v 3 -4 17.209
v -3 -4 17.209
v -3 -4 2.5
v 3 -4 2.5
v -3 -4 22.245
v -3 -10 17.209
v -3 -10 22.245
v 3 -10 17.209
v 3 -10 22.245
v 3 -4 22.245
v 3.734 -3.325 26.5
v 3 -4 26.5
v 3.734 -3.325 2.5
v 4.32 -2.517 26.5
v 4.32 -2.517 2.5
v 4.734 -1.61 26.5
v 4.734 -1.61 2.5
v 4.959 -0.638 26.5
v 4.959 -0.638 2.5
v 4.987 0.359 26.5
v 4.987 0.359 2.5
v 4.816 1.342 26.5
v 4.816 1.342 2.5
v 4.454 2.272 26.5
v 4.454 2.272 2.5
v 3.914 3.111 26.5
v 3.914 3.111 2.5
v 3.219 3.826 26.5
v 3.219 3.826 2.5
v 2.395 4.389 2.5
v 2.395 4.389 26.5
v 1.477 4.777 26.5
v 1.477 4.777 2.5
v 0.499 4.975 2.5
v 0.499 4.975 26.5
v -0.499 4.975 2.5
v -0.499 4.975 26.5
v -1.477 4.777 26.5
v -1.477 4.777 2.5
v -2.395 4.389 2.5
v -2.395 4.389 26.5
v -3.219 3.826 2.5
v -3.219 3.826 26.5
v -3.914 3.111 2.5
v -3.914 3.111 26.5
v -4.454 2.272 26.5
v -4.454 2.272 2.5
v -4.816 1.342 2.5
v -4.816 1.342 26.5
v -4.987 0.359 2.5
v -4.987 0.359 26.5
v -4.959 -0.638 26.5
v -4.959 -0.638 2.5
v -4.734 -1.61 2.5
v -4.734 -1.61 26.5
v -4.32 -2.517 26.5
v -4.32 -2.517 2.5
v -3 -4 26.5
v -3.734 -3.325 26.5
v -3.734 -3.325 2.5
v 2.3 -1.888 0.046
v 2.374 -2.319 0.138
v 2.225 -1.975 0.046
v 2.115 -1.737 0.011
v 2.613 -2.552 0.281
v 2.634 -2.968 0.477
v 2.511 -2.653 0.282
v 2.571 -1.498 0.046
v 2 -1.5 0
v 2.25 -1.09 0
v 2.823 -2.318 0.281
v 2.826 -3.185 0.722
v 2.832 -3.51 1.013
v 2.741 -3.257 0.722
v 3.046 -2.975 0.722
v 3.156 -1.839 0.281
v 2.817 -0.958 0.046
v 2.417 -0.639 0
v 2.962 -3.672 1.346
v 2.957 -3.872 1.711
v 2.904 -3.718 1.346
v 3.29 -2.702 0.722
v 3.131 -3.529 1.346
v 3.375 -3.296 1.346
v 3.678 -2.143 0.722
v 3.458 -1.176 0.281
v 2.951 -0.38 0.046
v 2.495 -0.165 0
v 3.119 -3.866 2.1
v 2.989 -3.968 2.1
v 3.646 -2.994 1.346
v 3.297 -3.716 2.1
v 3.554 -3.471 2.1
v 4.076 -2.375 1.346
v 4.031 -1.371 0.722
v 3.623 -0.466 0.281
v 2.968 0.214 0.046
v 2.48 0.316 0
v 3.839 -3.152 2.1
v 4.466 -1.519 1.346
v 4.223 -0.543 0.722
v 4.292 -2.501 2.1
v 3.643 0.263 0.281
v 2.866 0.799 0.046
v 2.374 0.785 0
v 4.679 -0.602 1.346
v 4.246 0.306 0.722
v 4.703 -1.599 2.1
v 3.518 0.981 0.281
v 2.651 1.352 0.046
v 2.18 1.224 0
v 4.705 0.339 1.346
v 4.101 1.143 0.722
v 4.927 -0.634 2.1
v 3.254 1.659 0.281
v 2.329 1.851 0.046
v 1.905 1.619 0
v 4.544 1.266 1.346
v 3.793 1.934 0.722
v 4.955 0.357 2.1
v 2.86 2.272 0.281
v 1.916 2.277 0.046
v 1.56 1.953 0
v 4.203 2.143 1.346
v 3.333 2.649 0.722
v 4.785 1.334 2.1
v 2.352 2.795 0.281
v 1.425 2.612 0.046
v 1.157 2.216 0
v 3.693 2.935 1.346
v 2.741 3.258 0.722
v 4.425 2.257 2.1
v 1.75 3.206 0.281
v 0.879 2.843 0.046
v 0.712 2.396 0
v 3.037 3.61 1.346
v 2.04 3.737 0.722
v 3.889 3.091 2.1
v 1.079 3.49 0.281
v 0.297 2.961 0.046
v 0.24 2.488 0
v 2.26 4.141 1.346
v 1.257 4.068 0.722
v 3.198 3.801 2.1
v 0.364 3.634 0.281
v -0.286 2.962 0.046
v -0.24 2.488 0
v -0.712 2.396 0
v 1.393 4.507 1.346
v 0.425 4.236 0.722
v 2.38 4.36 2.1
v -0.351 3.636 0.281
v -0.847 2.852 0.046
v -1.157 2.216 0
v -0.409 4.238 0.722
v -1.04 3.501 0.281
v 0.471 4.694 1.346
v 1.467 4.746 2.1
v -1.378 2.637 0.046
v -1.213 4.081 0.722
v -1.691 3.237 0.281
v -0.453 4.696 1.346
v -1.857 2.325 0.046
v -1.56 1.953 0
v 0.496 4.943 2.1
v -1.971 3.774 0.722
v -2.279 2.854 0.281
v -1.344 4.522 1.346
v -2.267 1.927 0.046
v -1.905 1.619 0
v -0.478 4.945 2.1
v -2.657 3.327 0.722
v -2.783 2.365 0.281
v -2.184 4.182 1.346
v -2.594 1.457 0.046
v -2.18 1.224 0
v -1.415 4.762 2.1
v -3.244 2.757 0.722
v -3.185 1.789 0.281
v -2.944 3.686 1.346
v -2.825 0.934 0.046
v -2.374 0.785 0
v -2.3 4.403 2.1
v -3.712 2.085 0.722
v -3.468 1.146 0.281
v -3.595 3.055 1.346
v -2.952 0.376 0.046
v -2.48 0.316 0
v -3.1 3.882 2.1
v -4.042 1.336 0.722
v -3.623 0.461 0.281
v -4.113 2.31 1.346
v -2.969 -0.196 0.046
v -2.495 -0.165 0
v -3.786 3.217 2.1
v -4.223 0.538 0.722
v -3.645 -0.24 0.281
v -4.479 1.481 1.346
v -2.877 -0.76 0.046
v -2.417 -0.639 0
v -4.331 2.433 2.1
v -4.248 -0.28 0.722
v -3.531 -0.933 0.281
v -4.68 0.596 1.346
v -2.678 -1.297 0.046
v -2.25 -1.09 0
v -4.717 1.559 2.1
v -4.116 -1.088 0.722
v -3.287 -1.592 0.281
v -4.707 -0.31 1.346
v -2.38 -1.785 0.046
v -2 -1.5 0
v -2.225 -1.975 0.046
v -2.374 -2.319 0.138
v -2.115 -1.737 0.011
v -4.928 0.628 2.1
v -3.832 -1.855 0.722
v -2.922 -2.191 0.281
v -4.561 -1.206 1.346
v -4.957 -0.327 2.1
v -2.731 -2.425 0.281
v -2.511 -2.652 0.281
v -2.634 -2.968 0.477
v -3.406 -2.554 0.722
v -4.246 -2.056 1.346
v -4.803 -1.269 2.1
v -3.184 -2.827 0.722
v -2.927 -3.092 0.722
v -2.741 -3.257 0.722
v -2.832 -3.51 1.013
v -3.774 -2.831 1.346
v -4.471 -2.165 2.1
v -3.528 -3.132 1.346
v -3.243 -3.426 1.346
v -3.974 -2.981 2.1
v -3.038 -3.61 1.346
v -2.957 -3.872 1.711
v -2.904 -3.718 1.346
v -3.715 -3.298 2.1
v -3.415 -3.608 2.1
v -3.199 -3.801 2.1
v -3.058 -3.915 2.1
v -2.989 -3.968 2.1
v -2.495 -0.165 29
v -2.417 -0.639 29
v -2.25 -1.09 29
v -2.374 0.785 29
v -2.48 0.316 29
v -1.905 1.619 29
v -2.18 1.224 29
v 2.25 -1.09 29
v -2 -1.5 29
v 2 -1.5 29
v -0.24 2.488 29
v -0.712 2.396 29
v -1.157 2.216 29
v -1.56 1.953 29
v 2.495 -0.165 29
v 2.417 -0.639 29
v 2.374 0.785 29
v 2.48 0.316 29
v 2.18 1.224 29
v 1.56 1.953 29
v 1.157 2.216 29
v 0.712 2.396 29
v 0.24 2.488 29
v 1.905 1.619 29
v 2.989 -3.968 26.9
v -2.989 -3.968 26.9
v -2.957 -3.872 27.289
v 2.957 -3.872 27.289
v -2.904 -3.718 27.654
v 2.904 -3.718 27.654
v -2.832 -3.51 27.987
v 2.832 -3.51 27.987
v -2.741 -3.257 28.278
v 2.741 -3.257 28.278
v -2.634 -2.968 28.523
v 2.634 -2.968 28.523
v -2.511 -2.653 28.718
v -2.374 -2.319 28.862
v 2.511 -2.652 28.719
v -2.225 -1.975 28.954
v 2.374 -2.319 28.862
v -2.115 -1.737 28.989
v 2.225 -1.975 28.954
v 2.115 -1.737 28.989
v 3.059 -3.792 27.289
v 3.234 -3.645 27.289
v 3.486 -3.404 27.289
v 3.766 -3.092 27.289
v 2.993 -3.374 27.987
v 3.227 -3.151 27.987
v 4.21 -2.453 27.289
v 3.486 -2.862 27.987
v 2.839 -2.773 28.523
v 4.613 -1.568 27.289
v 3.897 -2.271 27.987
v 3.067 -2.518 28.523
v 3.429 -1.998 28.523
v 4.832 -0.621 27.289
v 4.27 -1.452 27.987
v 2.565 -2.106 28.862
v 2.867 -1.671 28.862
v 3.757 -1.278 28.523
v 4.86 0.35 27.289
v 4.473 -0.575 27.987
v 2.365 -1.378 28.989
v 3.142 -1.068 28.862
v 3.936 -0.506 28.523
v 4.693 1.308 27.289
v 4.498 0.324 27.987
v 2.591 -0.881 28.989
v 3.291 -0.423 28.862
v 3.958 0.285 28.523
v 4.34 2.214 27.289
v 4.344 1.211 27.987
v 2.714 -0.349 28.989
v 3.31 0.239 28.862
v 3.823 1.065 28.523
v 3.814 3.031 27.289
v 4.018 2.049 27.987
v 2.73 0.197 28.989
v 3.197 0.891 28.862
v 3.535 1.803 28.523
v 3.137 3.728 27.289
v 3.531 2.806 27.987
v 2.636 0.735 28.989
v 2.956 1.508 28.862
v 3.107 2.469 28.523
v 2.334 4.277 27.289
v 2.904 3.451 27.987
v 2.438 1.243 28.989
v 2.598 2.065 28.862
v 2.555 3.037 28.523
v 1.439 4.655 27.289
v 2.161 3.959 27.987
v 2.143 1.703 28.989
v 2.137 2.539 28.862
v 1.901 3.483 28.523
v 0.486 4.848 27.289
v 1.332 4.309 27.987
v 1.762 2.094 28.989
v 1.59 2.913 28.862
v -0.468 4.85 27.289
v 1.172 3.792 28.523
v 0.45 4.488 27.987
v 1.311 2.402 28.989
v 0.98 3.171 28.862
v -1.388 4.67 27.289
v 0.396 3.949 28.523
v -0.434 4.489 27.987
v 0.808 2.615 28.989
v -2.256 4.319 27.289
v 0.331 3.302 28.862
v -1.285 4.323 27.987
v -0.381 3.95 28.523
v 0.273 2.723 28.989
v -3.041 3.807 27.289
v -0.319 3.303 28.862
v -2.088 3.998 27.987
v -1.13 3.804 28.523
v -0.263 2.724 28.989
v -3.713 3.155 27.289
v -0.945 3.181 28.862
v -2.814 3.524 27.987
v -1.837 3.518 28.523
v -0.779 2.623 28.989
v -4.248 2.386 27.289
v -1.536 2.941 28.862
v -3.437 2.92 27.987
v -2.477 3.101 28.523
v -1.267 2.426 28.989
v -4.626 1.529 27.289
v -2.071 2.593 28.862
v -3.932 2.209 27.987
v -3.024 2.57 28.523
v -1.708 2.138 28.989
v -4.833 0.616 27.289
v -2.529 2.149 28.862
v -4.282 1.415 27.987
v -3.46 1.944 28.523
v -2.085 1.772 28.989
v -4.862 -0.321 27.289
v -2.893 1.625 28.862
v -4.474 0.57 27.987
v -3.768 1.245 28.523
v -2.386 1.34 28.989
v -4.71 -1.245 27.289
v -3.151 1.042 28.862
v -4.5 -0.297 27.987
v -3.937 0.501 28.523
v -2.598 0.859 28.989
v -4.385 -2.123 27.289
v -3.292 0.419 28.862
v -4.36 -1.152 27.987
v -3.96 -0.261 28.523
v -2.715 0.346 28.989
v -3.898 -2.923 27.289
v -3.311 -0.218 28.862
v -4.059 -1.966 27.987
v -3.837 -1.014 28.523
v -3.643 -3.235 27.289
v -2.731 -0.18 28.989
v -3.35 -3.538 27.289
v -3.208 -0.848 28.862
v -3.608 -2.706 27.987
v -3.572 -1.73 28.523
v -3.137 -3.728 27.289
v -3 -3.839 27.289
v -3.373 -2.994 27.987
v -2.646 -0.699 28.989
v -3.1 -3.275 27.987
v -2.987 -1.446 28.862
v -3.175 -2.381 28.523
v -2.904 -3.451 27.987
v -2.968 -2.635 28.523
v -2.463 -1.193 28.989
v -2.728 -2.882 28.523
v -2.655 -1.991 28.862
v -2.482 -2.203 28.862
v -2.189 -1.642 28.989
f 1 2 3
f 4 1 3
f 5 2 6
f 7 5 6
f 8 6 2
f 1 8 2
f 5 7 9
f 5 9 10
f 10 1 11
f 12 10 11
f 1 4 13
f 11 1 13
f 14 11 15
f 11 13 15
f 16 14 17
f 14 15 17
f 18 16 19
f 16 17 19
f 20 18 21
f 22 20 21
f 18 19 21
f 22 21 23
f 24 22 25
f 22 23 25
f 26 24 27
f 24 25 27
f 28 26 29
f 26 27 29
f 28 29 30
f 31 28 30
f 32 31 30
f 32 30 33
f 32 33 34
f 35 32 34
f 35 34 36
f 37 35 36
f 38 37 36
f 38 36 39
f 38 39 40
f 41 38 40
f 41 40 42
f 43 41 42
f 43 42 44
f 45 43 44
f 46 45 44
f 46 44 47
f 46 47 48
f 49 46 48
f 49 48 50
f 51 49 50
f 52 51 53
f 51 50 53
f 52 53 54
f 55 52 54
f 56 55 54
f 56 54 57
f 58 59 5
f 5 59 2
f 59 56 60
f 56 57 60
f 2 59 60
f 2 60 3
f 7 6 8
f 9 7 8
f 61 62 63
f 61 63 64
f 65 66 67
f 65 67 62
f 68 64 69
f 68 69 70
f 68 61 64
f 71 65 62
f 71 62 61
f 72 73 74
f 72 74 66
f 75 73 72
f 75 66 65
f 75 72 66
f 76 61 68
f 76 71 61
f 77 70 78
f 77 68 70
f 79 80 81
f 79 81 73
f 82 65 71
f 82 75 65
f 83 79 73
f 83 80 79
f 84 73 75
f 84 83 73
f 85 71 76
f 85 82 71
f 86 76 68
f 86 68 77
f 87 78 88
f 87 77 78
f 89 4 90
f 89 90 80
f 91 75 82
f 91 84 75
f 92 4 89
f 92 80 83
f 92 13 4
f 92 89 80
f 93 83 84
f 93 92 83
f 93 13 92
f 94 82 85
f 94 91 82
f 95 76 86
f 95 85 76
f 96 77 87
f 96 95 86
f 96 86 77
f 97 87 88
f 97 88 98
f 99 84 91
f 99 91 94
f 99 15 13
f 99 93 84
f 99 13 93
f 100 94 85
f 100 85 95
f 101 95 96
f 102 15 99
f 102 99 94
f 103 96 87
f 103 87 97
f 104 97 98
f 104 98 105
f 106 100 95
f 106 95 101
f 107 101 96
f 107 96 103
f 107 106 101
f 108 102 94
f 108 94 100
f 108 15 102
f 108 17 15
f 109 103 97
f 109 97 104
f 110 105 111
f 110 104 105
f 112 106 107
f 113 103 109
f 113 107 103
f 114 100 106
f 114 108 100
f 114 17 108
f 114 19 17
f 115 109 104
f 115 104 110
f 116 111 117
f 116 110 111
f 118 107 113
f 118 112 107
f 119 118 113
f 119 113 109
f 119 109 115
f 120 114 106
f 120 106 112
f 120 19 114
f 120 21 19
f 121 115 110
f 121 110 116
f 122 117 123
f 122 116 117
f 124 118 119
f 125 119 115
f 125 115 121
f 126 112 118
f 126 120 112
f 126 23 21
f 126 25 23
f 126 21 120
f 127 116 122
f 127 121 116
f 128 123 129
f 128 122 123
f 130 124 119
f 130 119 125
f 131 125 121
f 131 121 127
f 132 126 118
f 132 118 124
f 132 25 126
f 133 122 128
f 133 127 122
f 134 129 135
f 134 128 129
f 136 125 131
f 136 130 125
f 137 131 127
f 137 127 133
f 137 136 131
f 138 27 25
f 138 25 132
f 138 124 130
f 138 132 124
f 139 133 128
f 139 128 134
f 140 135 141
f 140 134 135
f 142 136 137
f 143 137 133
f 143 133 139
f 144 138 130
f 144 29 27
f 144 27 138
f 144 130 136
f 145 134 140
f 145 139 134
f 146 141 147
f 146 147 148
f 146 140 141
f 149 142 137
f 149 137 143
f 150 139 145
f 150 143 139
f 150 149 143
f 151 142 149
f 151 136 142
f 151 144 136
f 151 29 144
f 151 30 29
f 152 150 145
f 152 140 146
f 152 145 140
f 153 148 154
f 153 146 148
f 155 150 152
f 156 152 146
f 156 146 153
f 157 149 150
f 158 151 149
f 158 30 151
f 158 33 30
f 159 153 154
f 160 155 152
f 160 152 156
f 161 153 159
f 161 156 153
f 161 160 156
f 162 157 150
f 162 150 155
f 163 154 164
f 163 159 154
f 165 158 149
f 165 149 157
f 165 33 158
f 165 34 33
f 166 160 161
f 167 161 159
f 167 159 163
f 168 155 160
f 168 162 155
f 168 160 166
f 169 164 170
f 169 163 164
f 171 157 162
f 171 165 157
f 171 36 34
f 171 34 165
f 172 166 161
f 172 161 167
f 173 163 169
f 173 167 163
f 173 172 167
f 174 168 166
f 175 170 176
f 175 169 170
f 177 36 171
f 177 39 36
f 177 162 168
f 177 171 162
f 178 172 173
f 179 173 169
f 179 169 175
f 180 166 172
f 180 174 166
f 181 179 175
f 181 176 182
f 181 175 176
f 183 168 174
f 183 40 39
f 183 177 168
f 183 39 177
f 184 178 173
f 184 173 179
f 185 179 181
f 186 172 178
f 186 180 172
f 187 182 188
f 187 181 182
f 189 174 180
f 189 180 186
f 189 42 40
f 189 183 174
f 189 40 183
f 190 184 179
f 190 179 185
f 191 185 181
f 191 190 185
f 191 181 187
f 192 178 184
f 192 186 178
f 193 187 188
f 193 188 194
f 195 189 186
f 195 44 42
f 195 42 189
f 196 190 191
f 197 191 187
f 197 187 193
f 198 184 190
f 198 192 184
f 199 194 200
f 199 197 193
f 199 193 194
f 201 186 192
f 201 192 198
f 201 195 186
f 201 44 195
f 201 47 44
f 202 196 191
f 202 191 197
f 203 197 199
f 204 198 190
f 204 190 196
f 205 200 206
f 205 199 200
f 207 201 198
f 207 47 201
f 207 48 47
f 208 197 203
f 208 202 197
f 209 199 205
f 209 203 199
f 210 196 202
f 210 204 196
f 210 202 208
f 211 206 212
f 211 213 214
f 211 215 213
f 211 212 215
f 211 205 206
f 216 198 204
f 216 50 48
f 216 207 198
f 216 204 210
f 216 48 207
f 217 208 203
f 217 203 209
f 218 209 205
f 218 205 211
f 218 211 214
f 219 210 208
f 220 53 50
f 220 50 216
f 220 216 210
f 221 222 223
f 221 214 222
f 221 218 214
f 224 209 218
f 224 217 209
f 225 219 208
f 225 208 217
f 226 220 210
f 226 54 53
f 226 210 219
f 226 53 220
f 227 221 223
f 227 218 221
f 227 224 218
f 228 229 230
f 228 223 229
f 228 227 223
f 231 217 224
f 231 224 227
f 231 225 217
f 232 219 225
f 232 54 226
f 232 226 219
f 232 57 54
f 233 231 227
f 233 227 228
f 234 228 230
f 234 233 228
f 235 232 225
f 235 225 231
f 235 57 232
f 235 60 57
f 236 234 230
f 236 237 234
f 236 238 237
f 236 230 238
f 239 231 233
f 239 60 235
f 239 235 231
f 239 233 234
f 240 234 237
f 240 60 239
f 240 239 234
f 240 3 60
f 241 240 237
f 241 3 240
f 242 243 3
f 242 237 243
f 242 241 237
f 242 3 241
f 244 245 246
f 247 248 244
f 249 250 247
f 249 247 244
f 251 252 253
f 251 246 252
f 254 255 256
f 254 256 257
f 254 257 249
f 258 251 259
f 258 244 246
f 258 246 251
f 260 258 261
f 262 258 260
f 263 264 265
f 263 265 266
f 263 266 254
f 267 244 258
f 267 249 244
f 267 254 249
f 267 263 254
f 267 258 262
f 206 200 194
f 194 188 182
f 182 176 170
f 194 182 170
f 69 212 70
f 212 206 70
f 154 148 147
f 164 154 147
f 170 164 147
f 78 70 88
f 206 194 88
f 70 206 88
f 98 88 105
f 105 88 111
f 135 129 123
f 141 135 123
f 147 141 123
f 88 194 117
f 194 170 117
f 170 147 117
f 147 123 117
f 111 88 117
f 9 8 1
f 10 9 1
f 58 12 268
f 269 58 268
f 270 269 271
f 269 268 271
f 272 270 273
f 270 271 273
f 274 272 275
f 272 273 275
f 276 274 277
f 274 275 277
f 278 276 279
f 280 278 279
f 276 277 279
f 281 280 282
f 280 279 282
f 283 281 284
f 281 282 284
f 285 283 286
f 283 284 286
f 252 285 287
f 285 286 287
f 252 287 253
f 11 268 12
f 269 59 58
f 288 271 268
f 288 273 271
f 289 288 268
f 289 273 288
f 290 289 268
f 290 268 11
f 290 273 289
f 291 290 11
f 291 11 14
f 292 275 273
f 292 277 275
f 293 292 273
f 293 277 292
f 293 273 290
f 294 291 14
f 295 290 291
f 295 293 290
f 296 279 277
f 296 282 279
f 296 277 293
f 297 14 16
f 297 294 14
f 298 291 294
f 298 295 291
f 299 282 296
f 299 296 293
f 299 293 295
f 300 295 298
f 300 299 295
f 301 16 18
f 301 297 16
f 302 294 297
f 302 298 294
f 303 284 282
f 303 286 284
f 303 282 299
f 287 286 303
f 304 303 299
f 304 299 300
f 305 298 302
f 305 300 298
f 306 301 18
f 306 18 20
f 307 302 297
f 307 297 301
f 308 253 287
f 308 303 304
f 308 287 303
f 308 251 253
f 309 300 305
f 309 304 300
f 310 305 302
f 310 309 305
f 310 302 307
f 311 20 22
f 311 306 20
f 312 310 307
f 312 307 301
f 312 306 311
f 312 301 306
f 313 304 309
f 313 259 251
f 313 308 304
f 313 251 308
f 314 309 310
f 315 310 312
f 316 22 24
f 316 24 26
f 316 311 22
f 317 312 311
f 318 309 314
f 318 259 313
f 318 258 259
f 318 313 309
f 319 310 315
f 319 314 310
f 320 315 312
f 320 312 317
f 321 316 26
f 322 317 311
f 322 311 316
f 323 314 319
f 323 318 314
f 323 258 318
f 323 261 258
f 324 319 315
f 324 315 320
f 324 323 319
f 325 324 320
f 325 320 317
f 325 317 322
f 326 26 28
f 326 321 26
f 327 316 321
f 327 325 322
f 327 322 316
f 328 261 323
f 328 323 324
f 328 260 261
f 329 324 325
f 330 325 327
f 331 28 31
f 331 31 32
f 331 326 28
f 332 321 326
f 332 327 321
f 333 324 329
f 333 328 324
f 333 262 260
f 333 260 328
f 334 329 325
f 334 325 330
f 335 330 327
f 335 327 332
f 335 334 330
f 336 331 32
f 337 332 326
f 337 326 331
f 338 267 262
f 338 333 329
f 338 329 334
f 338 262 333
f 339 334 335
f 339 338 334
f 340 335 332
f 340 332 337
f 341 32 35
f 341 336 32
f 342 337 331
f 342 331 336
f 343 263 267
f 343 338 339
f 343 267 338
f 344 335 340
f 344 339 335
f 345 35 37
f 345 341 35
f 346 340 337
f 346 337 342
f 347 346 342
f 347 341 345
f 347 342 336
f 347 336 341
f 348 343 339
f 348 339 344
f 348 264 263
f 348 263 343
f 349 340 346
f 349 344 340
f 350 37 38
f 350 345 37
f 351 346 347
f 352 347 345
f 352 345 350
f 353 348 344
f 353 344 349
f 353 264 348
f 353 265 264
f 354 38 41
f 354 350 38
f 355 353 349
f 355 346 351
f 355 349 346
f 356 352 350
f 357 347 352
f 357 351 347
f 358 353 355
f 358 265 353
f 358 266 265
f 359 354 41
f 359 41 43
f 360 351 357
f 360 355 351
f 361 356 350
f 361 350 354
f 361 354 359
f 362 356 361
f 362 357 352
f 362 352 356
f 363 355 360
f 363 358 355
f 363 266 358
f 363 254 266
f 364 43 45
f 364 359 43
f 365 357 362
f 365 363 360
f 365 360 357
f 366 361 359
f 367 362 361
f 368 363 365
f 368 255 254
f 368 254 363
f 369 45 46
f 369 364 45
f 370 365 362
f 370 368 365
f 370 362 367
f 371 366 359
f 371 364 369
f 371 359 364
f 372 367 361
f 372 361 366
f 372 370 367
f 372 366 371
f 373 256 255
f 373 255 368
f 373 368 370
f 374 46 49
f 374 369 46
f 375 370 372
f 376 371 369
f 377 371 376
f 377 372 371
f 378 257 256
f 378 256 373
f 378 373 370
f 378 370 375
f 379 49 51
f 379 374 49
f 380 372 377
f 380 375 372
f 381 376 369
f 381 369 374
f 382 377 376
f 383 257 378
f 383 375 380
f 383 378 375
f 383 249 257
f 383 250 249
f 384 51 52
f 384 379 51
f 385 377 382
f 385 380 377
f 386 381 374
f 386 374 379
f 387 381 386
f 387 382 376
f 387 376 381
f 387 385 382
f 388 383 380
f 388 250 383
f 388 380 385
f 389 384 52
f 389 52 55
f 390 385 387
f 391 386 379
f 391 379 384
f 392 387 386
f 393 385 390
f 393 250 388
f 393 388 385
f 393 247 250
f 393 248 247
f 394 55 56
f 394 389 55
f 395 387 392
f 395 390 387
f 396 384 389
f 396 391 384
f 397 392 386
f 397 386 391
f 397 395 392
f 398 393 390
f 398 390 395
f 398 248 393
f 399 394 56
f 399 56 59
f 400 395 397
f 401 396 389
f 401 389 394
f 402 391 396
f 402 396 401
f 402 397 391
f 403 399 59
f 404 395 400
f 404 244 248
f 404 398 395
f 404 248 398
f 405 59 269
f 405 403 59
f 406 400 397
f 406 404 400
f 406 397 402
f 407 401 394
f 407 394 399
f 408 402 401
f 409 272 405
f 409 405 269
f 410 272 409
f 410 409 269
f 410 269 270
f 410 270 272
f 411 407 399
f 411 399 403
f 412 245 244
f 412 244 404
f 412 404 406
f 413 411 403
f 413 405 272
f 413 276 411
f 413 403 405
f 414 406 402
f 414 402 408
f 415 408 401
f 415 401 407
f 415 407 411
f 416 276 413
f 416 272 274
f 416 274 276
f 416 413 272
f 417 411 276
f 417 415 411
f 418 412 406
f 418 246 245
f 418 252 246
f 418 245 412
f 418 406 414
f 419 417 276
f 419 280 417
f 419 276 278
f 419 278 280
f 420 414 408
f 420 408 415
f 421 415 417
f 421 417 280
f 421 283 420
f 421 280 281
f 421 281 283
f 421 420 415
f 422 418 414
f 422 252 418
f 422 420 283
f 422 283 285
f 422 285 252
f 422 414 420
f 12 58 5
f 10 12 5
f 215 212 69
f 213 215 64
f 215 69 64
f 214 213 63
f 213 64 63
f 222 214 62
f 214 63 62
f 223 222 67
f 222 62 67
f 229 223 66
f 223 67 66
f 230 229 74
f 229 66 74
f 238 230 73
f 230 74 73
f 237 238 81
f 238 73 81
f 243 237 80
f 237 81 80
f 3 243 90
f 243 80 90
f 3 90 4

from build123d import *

# Parameters (mm, degrees)
SALIENTE_EXTRUIR1_DEPTH    = 29
CORTAR_EXTRUIR7_DEPTH      = 32.080540536
CORTAR_EXTRUIR7_DEPTH_BACK = 32.080540536
CROQUIS5_W                 = 6.75461664
CROQUIS5_H                 = 6
CORTAR_EXTRUIR8_DEPTH      = 32.701734968
CORTAR_EXTRUIR8_DEPTH_BACK = 32.701734968
CROQUIS9_W                 = 17.209263494
CROQUIS9_H                 = 6
REDONDEO3_R                = 2.5


with BuildPart() as part:
    # Croquis2 → Saliente-Extruir1 (new body)
    with BuildSketch(Plane.XY):
        with BuildLine():
            Line((-3, -4), (-3, -10))
            Line((-3, -10), (3, -10))
            Line((3, -10), (3, -4))
            ThreePointArc((3, -4), (0, 5), (-3, -4))
        make_face()
    extrude(amount=SALIENTE_EXTRUIR1_DEPTH)

    # Croquis5 → Cortar-Extruir7 (cut, two sides: drawn at the far end of the back side and taken through both)
    with BuildSketch(Plane(origin=(0, 0, 0), x_dir=(0, 0, -1), z_dir=(1, 0, 0)).offset(-CORTAR_EXTRUIR7_DEPTH_BACK)):
        with Locations((-25.62269168, -7)):
            Rectangle(CROQUIS5_W, CROQUIS5_H)
    extrude(amount=CORTAR_EXTRUIR7_DEPTH + CORTAR_EXTRUIR7_DEPTH_BACK, mode=Mode.SUBTRACT)

    # Croquis9 → Cortar-Extruir8 (cut, two sides: drawn at the far end of the back side and taken through both)
    with BuildSketch(Plane(origin=(3, 0, 0), x_dir=(0, 0, -1), z_dir=(1, 0, 0)).offset(-CORTAR_EXTRUIR8_DEPTH_BACK)):
        with Locations((-8.604631747, -7)):
            Rectangle(CROQUIS9_W, CROQUIS9_H)
    extrude(amount=CORTAR_EXTRUIR8_DEPTH + CORTAR_EXTRUIR8_DEPTH_BACK, mode=Mode.SUBTRACT)

    # Redondeo3
    # the kernel refuses this fillet: 2.5 mm, written as the material it takes off along each edge
    with BuildSketch(Plane(origin=(9.25, -4, 29), x_dir=(0, 0, -1), z_dir=(-1, 0, 0))) as redondeo3_piece_1:
        with BuildLine():
            CenterArc((REDONDEO3_R, -REDONDEO3_R), REDONDEO3_R, 90, 90)
            Line((0, -REDONDEO3_R), (0, 0))
            Line((0, 0), (REDONDEO3_R, 0))
        make_face()
    extrude(amount=18.5, mode=Mode.SUBTRACT)
    with BuildSketch(Plane(origin=(9.25, -4, 0), x_dir=(0, 0, 1), z_dir=(-1, 0, 0))) as redondeo3_piece_2:
        with BuildLine():
            CenterArc((REDONDEO3_R, REDONDEO3_R), REDONDEO3_R, 180, 90)
            Line((0, REDONDEO3_R), (0, 0))
            Line((0, 0), (REDONDEO3_R, 0))
        make_face()
    extrude(amount=18.5, mode=Mode.SUBTRACT)
    with BuildSketch(Plane(origin=(0, 0, 0), x_dir=(0.0031415874858798706, -0.9999950652018581, 0), z_dir=(-0.9999950652018581, -0.0031415874858798706, 0))) as redondeo3_piece_3:
        with BuildLine():
            CenterArc((5 - REDONDEO3_R, REDONDEO3_R), REDONDEO3_R, 270, 90)
            Line((5 - REDONDEO3_R, 0), (5, 0))
            Line((5, 0), (5, REDONDEO3_R))
        make_face()
    revolve(axis=Axis((0, 0, 0), (0, 0, 1)), revolution_arc=359.64, mode=Mode.SUBTRACT)
    with BuildSketch(Plane(origin=(0, 0, 29), x_dir=(0.0031415874858798706, -0.9999950652018581, 0), z_dir=(-0.9999950652018581, -0.0031415874858798706, 0))) as redondeo3_piece_4:
        with BuildLine():
            CenterArc((5 - REDONDEO3_R, -REDONDEO3_R), REDONDEO3_R, 0, 90)
            Line((5 - REDONDEO3_R, 0), (5, 0))
            Line((5, 0), (5, -REDONDEO3_R))
        make_face()
    revolve(axis=Axis((0, 0, 29), (0, 0, 1)), revolution_arc=359.64, mode=Mode.SUBTRACT)


solid = part.part
